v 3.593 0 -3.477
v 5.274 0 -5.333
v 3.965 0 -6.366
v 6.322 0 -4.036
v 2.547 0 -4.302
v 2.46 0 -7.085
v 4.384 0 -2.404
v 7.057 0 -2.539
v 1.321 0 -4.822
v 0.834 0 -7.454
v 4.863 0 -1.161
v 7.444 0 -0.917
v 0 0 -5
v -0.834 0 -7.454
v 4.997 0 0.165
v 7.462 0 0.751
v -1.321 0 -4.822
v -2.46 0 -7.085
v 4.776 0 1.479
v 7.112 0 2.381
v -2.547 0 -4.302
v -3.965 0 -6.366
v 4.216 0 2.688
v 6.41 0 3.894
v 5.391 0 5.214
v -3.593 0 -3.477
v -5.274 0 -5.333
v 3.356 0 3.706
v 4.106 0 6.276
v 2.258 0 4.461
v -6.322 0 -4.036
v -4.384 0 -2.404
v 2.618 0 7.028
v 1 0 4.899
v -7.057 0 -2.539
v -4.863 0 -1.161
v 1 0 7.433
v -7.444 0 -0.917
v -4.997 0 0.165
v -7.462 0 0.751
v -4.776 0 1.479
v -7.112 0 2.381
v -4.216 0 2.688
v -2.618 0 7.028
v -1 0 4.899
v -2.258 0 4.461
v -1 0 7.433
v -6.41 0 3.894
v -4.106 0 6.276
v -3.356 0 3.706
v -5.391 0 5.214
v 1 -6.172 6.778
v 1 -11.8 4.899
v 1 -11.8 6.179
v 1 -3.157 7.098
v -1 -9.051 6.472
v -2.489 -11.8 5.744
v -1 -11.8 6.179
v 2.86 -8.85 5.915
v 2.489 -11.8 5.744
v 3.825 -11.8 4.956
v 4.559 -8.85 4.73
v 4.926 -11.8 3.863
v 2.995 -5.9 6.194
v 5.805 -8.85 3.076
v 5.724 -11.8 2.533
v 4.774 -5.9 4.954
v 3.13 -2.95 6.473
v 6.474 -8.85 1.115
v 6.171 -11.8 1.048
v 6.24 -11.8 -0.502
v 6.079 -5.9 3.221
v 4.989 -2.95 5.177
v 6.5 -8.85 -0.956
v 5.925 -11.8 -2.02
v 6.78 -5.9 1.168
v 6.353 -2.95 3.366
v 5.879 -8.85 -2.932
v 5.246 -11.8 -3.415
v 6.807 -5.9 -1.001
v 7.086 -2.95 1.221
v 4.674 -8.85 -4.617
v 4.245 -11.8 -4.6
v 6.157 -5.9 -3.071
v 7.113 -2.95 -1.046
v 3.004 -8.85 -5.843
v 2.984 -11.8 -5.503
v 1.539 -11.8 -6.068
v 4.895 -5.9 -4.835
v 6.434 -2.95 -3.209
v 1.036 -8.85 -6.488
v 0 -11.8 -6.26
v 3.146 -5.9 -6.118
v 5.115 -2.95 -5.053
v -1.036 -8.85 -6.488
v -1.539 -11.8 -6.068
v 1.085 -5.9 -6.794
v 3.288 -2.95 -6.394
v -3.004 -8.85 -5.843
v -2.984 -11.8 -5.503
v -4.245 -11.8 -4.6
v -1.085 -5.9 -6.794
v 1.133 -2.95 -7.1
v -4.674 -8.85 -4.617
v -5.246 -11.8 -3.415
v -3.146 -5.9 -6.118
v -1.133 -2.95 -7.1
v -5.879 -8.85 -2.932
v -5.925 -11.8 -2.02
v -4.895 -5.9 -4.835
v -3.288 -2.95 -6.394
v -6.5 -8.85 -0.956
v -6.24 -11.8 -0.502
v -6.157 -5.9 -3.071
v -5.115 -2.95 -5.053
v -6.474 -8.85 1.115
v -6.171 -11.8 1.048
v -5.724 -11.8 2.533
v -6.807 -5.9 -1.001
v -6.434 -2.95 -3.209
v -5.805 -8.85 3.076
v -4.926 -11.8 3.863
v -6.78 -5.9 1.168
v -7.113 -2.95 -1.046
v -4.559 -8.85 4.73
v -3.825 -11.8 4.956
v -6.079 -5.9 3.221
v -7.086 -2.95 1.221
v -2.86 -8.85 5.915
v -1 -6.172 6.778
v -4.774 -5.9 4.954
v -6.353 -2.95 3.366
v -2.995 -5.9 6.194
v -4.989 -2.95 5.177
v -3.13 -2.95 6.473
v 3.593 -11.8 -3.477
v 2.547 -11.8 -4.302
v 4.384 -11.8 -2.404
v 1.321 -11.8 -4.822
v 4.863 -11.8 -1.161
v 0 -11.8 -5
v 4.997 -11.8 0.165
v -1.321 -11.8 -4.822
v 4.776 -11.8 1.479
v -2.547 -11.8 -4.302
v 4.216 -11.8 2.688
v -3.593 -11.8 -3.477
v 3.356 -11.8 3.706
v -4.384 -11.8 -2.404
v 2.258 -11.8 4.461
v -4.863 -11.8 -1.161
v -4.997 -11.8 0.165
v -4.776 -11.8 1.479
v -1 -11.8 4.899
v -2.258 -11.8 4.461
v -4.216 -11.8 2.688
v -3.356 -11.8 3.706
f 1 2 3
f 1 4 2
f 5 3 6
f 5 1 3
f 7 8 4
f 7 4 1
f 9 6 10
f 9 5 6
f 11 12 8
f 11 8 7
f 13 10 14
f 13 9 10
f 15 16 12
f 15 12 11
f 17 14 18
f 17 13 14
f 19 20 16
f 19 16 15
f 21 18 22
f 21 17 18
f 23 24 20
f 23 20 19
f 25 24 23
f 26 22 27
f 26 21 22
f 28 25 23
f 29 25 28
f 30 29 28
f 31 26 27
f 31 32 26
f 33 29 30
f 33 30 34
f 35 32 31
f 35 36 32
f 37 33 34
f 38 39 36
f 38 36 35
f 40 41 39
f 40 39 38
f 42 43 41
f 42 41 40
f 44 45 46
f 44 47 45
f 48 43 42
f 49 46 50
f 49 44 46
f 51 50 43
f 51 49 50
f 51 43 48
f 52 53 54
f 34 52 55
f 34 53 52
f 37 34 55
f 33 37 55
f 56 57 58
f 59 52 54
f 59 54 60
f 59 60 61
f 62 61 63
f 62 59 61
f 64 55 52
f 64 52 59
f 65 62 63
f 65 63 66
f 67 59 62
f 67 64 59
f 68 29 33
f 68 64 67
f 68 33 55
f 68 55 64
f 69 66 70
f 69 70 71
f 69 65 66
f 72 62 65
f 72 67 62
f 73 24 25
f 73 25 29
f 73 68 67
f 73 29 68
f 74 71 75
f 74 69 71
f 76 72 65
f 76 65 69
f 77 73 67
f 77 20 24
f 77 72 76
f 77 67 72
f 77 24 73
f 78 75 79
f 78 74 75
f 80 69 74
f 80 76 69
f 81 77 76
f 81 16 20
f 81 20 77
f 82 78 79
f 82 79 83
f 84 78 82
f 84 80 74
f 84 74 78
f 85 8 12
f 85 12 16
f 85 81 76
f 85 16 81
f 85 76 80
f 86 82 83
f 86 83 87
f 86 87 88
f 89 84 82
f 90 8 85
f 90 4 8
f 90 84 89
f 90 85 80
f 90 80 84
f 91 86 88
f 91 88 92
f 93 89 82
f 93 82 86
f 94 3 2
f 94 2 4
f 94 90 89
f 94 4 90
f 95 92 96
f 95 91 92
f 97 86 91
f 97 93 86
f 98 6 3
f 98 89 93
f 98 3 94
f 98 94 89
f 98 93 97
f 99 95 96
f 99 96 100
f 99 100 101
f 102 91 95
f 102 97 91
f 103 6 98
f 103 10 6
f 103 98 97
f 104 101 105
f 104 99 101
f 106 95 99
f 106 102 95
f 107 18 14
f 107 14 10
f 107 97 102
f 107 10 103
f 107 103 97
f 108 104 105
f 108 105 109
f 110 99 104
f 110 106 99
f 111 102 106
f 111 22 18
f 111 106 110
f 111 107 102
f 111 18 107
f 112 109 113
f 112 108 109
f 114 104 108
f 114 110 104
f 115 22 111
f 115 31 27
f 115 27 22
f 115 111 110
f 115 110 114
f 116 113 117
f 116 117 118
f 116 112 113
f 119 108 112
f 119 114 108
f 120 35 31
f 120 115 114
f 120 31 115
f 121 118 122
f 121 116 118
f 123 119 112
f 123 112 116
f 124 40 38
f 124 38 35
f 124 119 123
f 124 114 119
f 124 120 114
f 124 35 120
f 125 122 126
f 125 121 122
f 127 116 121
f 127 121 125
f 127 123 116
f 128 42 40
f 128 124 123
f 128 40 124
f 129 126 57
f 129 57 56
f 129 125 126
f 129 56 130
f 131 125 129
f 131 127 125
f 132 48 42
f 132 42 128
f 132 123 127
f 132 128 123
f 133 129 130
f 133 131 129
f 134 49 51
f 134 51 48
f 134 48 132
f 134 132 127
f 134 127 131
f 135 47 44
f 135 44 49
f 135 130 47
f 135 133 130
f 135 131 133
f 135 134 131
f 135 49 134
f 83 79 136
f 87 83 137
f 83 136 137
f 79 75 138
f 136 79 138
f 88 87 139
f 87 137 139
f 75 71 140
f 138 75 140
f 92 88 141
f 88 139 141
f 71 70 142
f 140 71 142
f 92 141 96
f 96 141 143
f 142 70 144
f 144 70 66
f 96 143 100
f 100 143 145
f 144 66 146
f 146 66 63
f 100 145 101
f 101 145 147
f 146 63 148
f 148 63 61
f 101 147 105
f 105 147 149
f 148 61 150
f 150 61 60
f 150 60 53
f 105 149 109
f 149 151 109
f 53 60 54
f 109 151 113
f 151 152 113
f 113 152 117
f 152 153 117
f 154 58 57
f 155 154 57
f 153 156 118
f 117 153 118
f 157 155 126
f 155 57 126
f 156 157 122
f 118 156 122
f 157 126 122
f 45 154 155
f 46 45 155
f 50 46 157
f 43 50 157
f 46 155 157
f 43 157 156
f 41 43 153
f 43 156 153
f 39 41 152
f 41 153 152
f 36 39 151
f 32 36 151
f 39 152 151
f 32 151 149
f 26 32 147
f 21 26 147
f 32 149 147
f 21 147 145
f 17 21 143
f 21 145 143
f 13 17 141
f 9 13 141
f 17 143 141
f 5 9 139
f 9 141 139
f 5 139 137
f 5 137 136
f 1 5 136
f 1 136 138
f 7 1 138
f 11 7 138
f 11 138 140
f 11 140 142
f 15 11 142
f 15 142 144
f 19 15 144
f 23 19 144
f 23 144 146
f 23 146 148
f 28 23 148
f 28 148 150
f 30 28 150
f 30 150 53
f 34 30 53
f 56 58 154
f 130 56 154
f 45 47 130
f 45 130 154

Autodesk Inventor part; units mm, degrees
ref_plane "YZ Plane" through (0, 0, 0) normal (1, 0, 0) x (0, 1, 0)
ref_plane "XZ Plane" through (0, 0, 0) normal (0, 1, 0) x (-1, 0, 0)
ref_plane "XY Plane" through (0, 0, 0) normal (0, 0, 1) x (1, 0, 0)
sketch "Skizze1" plane through (0, 0, 0) normal (0, 1, 0) x (-1, 0, 0)
  circle A0 centre (0, 0) radius 7.5
  dimension "d0" = 15
extrude "Extrusion1" add sketch "Skizze1" against normal blind 11.8
draft "Flächenverjüngung1" angle 6 pull direction (0, -1, 0) faces at (-7.4757, -7.8667, -0.6035) fixed edges at (7.5, 0, 0)
sketch "Skizze2" plane through (0, 0, 0) normal (0, 1, 0) x (1, 0, 0)
  circle A0 centre (0, 0) radius 7.5 projected
hole "Bohrung1" at (0, 0, 0) direction (0, -1, 0) diameter 10 depth 11.8
sketch "Skizze4" plane through (0, 0, 0) normal (0, 1, 0) x (1, 0, 0)
  line L0 (1, -7.5) -> (-1, -7.5)
  line L1 (-1, -7.5) -> (-1, -4.899)
  line L2 (1, -4.899) -> (1, -7.5)
  circle A0 centre (0, 0) radius 5 projected
  circle A1 centre (0, 0) radius 7.5 projected
  point P0 (0, -7.5)
  point P1 (-1, -7.433)
  point P2 (1, -7.433)
  point P3 (0, -7.5)
  dimension "d12" = 2
extrude "Extrusion2" cut sketch "Skizze4" against normal up to surface (11.8 mm away) contours A1 L1 A0 L2 picked at (0, -5.8258)
properties part number "konus"
